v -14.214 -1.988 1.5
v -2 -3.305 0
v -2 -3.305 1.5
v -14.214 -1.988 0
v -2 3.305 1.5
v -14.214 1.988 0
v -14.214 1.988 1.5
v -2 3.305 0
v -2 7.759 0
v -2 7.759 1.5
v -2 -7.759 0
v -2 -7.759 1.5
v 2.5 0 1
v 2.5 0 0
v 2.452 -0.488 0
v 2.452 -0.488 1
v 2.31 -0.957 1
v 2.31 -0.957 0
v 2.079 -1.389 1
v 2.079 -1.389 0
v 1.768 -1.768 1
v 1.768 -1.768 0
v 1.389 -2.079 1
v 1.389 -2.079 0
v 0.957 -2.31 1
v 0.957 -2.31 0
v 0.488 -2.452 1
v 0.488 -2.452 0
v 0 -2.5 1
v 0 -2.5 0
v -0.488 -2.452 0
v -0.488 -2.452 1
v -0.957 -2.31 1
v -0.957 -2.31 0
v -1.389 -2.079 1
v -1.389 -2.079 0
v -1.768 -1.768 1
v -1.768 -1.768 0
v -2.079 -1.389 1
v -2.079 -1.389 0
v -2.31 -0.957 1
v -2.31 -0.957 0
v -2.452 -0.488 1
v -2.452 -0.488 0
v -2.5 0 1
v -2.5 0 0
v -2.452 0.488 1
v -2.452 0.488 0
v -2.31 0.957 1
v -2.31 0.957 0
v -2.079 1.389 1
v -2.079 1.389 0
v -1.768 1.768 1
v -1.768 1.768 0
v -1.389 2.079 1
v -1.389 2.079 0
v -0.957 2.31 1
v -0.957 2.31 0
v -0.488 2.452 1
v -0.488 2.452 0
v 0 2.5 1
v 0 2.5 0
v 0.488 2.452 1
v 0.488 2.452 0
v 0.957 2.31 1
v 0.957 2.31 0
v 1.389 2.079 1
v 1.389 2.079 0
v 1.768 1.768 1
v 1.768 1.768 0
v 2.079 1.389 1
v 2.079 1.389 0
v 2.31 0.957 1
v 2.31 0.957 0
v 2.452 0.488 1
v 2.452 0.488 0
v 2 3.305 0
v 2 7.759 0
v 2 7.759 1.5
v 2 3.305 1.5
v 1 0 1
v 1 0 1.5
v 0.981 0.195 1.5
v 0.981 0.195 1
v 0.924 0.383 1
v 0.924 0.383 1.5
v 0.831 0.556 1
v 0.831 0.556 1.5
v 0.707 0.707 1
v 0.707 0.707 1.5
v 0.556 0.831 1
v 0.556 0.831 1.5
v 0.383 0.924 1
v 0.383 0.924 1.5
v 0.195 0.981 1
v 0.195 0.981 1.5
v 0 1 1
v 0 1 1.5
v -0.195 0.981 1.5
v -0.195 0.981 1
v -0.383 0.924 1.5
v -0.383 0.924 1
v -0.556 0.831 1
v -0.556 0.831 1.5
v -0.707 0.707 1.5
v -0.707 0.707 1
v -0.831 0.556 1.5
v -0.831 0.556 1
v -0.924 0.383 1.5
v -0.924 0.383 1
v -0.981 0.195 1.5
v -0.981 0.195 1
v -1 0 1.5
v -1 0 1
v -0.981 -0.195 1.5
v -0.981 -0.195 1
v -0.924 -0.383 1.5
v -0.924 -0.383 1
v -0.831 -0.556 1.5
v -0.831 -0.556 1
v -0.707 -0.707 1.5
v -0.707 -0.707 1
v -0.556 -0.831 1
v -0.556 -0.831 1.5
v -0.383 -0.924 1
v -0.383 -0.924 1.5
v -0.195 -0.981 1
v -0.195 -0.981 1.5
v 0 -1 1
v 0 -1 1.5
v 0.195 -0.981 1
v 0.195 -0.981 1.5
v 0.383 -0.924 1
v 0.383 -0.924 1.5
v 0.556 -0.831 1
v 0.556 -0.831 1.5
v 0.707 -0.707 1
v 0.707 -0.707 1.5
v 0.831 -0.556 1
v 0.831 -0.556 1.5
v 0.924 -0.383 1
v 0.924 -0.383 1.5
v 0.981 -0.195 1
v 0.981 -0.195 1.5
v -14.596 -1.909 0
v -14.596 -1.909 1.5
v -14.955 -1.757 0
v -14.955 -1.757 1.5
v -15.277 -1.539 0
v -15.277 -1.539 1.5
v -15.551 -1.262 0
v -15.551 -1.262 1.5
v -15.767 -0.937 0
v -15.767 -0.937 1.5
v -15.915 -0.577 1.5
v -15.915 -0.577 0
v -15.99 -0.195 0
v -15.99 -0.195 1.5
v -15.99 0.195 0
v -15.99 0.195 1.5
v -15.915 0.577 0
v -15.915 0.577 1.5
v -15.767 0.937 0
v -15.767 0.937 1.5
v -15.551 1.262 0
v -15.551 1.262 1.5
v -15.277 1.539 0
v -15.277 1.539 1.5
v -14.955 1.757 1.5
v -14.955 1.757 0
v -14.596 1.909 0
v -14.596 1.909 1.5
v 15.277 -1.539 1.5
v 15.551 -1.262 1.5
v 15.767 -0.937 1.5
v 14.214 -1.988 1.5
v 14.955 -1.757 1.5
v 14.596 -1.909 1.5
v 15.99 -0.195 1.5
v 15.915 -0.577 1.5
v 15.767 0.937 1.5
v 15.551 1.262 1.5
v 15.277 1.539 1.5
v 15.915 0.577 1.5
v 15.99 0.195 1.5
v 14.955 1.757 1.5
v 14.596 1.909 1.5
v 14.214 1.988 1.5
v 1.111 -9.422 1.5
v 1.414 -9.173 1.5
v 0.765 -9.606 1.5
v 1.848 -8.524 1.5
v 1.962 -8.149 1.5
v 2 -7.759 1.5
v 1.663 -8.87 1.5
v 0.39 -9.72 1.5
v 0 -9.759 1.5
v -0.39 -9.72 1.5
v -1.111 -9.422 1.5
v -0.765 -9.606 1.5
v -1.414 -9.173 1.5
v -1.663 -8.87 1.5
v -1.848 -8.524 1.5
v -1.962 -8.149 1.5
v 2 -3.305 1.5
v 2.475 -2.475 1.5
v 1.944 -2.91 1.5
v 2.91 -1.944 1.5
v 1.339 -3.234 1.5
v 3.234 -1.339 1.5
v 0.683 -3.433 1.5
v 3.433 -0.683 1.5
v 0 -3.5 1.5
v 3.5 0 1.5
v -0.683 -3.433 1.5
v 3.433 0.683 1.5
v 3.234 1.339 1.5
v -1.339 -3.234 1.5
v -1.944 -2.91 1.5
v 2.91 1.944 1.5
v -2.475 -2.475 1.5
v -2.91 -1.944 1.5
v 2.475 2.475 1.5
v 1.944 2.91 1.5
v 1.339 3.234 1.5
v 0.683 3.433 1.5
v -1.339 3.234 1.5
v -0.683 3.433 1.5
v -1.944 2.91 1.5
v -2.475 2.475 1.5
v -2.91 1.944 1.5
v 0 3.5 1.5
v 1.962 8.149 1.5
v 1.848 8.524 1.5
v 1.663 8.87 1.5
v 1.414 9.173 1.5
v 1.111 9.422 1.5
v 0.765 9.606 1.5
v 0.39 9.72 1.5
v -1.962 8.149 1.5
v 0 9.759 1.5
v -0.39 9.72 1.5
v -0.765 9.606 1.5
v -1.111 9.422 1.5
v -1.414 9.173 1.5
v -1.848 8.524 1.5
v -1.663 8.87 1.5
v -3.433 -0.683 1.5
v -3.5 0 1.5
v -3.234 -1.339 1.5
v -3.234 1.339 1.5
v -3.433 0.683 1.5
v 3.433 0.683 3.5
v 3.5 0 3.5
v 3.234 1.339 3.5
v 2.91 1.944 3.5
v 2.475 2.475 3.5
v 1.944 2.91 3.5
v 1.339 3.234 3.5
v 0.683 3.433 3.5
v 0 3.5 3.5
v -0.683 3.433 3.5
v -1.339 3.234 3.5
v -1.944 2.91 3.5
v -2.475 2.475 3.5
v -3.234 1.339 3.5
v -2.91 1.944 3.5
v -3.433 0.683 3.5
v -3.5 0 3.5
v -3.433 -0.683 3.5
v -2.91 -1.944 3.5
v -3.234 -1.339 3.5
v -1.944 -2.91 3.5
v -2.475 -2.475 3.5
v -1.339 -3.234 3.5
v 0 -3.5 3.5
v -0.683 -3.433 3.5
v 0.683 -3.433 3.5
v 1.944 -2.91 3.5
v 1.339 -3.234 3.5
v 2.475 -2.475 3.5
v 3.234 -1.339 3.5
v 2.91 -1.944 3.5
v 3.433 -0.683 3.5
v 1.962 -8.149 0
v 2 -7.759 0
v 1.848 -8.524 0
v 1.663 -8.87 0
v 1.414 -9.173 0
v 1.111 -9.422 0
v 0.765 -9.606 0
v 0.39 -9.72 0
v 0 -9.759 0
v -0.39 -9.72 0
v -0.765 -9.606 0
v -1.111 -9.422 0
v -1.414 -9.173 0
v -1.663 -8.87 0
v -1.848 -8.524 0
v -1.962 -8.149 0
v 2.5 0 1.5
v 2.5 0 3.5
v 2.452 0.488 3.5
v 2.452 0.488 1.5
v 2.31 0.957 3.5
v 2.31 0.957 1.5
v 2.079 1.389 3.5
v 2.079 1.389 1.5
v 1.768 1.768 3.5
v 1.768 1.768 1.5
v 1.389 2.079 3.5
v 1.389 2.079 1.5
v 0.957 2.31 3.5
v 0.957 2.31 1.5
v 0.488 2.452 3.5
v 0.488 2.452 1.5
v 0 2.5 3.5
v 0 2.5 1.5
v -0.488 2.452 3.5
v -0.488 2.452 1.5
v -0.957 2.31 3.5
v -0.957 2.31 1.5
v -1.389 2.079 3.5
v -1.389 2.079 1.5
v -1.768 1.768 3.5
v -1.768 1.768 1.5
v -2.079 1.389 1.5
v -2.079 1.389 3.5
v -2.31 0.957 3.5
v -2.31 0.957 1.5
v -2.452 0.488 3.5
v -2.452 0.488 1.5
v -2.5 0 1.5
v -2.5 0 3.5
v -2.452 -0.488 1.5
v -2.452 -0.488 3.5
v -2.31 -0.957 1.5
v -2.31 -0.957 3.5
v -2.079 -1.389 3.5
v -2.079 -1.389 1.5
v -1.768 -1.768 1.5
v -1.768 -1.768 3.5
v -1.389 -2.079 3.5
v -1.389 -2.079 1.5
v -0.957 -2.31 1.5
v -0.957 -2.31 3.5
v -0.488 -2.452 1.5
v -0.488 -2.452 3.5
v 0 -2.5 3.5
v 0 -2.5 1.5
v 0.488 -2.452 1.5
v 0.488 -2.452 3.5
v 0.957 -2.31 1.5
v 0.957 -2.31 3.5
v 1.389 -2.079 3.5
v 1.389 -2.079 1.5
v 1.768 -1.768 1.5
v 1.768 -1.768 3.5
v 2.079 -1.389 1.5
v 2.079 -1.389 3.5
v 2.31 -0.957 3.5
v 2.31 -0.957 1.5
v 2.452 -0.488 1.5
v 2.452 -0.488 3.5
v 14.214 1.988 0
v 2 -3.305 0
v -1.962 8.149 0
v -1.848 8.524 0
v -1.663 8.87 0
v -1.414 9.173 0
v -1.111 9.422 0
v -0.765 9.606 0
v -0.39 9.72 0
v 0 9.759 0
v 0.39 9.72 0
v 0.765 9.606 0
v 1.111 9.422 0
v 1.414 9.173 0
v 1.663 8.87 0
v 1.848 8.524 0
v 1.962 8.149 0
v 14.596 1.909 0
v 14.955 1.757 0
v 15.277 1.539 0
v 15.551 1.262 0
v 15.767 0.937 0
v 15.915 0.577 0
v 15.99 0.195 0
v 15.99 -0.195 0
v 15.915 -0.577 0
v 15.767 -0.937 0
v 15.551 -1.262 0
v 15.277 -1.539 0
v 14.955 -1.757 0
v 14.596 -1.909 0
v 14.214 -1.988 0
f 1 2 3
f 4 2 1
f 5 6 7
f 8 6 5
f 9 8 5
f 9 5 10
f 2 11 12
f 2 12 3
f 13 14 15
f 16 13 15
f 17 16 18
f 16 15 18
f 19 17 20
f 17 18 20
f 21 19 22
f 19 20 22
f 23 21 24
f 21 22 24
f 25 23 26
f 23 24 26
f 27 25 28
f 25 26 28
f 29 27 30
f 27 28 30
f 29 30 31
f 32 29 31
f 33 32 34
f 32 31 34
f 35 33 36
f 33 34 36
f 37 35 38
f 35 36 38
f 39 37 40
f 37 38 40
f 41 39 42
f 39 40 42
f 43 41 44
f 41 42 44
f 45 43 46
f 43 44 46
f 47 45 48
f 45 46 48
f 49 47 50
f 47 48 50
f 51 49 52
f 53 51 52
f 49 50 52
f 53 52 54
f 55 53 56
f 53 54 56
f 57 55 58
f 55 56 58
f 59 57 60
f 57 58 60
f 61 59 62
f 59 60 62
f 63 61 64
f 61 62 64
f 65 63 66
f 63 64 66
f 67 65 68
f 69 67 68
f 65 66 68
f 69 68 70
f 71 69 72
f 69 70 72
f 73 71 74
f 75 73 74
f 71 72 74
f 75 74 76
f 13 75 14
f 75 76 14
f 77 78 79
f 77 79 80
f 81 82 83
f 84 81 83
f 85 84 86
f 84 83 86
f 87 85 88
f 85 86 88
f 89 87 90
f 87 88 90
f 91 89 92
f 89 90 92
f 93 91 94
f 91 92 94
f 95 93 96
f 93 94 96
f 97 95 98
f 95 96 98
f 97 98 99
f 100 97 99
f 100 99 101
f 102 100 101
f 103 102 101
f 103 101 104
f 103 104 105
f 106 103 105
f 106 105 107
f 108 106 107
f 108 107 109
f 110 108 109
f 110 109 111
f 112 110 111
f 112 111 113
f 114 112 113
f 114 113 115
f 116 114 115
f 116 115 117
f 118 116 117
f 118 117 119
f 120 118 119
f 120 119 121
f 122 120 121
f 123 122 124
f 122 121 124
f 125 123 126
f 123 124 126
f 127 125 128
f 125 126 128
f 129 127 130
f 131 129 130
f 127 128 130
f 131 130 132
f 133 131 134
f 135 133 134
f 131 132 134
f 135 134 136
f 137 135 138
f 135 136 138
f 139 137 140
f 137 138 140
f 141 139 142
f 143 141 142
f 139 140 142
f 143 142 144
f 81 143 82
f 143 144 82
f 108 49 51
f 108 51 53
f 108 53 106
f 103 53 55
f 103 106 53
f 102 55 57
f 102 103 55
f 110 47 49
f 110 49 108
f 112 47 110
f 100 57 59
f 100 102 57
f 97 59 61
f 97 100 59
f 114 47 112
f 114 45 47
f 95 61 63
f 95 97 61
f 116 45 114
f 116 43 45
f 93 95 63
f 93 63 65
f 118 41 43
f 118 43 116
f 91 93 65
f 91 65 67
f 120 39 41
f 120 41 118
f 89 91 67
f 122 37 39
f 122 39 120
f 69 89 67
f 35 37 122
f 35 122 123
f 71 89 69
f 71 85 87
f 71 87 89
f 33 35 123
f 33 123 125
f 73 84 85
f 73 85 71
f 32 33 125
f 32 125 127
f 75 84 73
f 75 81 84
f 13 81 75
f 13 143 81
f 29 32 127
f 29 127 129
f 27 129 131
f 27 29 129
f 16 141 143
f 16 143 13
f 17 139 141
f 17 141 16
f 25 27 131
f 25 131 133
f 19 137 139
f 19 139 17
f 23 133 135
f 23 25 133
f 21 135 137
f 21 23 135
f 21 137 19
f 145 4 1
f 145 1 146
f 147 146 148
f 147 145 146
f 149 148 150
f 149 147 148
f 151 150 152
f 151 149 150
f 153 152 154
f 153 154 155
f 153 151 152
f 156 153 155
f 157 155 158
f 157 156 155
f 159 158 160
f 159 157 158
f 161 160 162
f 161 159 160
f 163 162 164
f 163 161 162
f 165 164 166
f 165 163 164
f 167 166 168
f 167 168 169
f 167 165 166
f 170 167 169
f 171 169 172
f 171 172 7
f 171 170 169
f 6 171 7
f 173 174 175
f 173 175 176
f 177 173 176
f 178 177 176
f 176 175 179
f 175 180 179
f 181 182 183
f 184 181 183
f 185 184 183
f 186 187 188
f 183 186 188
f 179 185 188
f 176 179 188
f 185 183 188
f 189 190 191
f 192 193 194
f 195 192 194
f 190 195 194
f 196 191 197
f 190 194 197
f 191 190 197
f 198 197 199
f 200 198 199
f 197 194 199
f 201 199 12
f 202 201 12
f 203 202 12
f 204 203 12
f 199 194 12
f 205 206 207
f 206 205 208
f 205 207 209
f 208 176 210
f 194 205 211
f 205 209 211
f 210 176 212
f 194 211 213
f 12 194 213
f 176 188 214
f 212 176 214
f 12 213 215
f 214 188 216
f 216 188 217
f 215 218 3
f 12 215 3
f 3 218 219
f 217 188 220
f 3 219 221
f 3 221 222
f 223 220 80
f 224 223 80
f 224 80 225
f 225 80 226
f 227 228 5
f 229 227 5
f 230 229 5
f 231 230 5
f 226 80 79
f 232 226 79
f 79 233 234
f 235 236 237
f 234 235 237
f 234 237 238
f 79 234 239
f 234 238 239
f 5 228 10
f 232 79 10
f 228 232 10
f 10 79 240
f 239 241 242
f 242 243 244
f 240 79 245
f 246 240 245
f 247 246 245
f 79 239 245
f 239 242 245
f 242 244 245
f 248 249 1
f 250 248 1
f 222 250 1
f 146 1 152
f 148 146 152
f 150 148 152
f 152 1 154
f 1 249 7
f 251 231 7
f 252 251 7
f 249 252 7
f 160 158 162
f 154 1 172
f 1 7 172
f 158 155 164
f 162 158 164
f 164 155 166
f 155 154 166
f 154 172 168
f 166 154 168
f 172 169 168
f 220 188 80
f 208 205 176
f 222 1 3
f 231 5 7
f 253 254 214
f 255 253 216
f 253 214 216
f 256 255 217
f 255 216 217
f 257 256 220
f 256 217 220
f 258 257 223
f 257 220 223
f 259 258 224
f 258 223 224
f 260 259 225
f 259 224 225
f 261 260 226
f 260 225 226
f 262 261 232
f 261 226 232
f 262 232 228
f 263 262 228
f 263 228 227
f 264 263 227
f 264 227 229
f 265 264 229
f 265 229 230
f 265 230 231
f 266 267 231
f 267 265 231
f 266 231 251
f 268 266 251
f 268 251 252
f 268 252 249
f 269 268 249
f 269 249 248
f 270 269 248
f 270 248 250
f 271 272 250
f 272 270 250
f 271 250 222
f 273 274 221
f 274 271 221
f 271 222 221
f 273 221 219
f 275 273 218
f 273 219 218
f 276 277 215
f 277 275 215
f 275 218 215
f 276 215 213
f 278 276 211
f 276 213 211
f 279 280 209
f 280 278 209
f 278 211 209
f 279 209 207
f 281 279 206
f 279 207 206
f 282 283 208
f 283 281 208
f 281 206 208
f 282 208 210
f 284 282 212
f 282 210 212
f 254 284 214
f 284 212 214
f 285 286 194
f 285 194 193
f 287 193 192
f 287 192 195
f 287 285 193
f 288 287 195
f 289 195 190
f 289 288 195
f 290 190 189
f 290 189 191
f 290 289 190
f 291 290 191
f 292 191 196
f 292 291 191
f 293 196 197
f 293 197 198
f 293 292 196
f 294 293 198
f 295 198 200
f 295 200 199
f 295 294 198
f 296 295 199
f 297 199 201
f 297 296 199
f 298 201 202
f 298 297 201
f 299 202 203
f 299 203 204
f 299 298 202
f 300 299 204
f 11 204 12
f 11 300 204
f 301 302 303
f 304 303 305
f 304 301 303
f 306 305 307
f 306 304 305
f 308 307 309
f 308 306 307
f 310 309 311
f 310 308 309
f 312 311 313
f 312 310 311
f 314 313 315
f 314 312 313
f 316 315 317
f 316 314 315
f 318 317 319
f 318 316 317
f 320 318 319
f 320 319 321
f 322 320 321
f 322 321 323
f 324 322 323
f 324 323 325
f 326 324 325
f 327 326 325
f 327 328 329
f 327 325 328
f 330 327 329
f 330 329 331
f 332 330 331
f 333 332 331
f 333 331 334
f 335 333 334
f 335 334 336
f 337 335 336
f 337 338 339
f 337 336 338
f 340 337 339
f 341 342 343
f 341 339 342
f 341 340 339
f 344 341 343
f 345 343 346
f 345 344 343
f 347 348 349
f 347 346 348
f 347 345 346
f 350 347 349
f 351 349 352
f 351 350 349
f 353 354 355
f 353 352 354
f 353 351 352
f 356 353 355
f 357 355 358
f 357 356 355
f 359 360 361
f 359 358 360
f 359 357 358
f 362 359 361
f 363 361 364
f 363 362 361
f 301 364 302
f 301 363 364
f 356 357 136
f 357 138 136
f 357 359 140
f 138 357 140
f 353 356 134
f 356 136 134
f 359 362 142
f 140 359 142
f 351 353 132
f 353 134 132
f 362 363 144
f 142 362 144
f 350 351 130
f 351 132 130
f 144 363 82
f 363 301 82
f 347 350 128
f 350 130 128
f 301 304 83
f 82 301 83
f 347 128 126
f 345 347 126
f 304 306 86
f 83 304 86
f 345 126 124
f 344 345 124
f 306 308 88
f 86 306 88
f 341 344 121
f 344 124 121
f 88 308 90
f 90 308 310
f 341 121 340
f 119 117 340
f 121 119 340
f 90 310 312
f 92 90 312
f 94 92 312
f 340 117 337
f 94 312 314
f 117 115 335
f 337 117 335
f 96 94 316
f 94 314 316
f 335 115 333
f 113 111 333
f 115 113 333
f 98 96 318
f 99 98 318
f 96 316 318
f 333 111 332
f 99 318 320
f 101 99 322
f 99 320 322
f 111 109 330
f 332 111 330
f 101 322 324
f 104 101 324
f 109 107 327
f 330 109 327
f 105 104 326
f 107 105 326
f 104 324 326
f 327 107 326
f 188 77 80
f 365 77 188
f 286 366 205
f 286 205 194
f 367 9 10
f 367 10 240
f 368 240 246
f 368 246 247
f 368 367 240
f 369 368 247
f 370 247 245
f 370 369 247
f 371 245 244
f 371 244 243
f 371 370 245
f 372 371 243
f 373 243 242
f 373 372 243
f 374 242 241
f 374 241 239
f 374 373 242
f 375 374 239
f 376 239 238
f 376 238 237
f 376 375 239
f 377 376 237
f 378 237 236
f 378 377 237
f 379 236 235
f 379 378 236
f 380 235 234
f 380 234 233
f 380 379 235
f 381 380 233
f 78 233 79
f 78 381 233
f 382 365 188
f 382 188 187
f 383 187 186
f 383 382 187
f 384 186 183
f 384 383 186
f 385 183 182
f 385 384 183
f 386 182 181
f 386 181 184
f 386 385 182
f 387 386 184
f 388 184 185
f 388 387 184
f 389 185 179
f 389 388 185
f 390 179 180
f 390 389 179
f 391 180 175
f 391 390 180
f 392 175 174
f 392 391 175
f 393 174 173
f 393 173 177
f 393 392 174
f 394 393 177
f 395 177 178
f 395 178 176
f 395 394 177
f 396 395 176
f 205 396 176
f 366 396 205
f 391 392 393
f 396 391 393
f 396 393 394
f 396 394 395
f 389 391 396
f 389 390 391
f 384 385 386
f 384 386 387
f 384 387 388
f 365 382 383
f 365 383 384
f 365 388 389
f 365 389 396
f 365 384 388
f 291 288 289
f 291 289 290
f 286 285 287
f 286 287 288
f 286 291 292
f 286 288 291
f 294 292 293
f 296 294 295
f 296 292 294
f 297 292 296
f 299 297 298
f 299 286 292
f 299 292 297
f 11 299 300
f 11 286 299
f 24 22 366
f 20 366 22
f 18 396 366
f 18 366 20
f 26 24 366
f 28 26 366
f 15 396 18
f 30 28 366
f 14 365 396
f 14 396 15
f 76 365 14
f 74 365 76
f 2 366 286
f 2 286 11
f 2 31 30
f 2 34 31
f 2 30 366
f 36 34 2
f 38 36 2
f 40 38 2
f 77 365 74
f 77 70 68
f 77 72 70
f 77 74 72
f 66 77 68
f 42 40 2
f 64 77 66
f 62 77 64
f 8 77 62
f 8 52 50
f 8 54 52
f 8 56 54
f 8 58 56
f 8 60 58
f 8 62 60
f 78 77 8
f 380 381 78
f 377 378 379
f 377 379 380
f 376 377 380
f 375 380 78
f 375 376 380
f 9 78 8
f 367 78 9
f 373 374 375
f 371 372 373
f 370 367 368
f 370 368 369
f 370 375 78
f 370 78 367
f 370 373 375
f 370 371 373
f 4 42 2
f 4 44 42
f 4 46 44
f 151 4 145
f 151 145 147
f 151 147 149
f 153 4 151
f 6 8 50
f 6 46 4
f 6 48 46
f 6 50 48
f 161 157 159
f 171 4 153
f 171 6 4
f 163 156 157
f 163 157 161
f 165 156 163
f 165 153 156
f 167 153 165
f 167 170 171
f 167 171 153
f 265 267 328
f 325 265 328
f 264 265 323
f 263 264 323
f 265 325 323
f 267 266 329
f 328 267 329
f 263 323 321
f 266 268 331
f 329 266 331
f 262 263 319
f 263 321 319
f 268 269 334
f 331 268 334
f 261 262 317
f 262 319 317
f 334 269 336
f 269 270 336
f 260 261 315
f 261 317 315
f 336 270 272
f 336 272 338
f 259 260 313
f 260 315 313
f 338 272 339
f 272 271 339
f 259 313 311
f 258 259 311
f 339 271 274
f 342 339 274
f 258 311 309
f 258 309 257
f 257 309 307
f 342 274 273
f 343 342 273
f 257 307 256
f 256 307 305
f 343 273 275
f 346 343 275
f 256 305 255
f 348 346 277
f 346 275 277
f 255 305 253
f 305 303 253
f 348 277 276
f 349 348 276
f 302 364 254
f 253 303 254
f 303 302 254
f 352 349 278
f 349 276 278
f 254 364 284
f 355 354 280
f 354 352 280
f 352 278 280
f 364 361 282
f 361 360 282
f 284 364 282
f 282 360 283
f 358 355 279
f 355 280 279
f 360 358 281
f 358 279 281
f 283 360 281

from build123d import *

# Parameters (mm, degrees)
BOSS_EXTRUDE1_DEPTH        = 1.5
SKETCH2_R                  = 3.5
SKETCH2_R_2                = 2.5
BOSS_EXTRUDE2_DEPTH        = 2.2
CUT_EXTRUDE1_REACH         = 20.87
SKETCH3_R                  = 1
SKETCH4_R                  = 2.5
CUT_EXTRUDE2_DEPTH         = 1
KES_EKSTR_ZYON1_DEPTH      = 10
KES_EKSTR_ZYON1_DEPTH_BACK = 10
IZIM1_W                    = 9.284710386
IZIM1_H                    = 2.096547507


with BuildPart() as part:
    # Sketch1 → Boss-Extrude1 (new body)
    with BuildSketch(Plane.XY):
        with BuildLine():
            Line((2, 7.75863865), (2, 3.304737557))
            Line((2, 3.304737557), (14.214285714, 1.988487272))
            ThreePointArc((14.214285714, 1.988487272), (16, 0), (14.214285714, -1.988487272))
            Line((14.214285714, -1.988487272), (2, -3.304737557))
            Line((2, -3.304737557), (2, -7.75863865))
            ThreePointArc((2, -7.75863865), (0, -9.75863865), (-2, -7.75863865))
            Line((-2, -7.75863865), (-2, -3.304737557))
            Line((-2, -3.304737557), (-14.214285714, -1.988487272))
            ThreePointArc((-14.214285714, -1.988487272), (-16, 0), (-14.214285714, 1.988487272))
            Line((-14.214285714, 1.988487272), (-2, 3.304737557))
            Line((-2, 3.304737557), (-2, 7.75863865))
            ThreePointArc((-2, 7.75863865), (0, 9.75863865), (2, 7.75863865))
        make_face()
    extrude(amount=BOSS_EXTRUDE1_DEPTH)

    # Sketch2 → Boss-Extrude2 (add)
    with BuildSketch(Plane.XY.offset(1.5)):
        Circle(SKETCH2_R)
        Circle(SKETCH2_R_2, mode=Mode.SUBTRACT)
    extrude(amount=BOSS_EXTRUDE2_DEPTH)

    # Sketch3 → Cut-Extrude1 (cut, up to next)
    with BuildSketch(Plane.XY.offset(1.5), mode=Mode.PRIVATE) as cut_extrude1_sk1:
        Circle(SKETCH3_R)
    cut_extrude1_tool1 = extrude(cut_extrude1_sk1.sketch, amount=-CUT_EXTRUDE1_REACH, mode=Mode.PRIVATE) & part.part
    add(cut_extrude1_tool1.solids().sort_by_distance((0, 0, 1.5))[0], mode=Mode.SUBTRACT)

    # Sketch4 → Cut-Extrude2 (cut)
    with BuildSketch(Plane(origin=(0, 0, 0), x_dir=(-1, 0, 0), z_dir=(0, 0, -1))):
        Circle(SKETCH4_R)
    extrude(amount=-CUT_EXTRUDE2_DEPTH, mode=Mode.SUBTRACT)

    # Çizim1 → Kes-Ekstrüzyon1 (cut, two sides: drawn at the far end of the back side and taken through both)
    with BuildSketch(Plane(origin=(0, 0, 0), x_dir=(1, 0, 0), z_dir=(0, 1, 0)).offset(-KES_EKSTR_ZYON1_DEPTH_BACK)):
        with Locations((-0.129205193, -4.548273754)):
            Rectangle(IZIM1_W, IZIM1_H)
    extrude(amount=KES_EKSTR_ZYON1_DEPTH + KES_EKSTR_ZYON1_DEPTH_BACK, mode=Mode.SUBTRACT)


solid = part.part
